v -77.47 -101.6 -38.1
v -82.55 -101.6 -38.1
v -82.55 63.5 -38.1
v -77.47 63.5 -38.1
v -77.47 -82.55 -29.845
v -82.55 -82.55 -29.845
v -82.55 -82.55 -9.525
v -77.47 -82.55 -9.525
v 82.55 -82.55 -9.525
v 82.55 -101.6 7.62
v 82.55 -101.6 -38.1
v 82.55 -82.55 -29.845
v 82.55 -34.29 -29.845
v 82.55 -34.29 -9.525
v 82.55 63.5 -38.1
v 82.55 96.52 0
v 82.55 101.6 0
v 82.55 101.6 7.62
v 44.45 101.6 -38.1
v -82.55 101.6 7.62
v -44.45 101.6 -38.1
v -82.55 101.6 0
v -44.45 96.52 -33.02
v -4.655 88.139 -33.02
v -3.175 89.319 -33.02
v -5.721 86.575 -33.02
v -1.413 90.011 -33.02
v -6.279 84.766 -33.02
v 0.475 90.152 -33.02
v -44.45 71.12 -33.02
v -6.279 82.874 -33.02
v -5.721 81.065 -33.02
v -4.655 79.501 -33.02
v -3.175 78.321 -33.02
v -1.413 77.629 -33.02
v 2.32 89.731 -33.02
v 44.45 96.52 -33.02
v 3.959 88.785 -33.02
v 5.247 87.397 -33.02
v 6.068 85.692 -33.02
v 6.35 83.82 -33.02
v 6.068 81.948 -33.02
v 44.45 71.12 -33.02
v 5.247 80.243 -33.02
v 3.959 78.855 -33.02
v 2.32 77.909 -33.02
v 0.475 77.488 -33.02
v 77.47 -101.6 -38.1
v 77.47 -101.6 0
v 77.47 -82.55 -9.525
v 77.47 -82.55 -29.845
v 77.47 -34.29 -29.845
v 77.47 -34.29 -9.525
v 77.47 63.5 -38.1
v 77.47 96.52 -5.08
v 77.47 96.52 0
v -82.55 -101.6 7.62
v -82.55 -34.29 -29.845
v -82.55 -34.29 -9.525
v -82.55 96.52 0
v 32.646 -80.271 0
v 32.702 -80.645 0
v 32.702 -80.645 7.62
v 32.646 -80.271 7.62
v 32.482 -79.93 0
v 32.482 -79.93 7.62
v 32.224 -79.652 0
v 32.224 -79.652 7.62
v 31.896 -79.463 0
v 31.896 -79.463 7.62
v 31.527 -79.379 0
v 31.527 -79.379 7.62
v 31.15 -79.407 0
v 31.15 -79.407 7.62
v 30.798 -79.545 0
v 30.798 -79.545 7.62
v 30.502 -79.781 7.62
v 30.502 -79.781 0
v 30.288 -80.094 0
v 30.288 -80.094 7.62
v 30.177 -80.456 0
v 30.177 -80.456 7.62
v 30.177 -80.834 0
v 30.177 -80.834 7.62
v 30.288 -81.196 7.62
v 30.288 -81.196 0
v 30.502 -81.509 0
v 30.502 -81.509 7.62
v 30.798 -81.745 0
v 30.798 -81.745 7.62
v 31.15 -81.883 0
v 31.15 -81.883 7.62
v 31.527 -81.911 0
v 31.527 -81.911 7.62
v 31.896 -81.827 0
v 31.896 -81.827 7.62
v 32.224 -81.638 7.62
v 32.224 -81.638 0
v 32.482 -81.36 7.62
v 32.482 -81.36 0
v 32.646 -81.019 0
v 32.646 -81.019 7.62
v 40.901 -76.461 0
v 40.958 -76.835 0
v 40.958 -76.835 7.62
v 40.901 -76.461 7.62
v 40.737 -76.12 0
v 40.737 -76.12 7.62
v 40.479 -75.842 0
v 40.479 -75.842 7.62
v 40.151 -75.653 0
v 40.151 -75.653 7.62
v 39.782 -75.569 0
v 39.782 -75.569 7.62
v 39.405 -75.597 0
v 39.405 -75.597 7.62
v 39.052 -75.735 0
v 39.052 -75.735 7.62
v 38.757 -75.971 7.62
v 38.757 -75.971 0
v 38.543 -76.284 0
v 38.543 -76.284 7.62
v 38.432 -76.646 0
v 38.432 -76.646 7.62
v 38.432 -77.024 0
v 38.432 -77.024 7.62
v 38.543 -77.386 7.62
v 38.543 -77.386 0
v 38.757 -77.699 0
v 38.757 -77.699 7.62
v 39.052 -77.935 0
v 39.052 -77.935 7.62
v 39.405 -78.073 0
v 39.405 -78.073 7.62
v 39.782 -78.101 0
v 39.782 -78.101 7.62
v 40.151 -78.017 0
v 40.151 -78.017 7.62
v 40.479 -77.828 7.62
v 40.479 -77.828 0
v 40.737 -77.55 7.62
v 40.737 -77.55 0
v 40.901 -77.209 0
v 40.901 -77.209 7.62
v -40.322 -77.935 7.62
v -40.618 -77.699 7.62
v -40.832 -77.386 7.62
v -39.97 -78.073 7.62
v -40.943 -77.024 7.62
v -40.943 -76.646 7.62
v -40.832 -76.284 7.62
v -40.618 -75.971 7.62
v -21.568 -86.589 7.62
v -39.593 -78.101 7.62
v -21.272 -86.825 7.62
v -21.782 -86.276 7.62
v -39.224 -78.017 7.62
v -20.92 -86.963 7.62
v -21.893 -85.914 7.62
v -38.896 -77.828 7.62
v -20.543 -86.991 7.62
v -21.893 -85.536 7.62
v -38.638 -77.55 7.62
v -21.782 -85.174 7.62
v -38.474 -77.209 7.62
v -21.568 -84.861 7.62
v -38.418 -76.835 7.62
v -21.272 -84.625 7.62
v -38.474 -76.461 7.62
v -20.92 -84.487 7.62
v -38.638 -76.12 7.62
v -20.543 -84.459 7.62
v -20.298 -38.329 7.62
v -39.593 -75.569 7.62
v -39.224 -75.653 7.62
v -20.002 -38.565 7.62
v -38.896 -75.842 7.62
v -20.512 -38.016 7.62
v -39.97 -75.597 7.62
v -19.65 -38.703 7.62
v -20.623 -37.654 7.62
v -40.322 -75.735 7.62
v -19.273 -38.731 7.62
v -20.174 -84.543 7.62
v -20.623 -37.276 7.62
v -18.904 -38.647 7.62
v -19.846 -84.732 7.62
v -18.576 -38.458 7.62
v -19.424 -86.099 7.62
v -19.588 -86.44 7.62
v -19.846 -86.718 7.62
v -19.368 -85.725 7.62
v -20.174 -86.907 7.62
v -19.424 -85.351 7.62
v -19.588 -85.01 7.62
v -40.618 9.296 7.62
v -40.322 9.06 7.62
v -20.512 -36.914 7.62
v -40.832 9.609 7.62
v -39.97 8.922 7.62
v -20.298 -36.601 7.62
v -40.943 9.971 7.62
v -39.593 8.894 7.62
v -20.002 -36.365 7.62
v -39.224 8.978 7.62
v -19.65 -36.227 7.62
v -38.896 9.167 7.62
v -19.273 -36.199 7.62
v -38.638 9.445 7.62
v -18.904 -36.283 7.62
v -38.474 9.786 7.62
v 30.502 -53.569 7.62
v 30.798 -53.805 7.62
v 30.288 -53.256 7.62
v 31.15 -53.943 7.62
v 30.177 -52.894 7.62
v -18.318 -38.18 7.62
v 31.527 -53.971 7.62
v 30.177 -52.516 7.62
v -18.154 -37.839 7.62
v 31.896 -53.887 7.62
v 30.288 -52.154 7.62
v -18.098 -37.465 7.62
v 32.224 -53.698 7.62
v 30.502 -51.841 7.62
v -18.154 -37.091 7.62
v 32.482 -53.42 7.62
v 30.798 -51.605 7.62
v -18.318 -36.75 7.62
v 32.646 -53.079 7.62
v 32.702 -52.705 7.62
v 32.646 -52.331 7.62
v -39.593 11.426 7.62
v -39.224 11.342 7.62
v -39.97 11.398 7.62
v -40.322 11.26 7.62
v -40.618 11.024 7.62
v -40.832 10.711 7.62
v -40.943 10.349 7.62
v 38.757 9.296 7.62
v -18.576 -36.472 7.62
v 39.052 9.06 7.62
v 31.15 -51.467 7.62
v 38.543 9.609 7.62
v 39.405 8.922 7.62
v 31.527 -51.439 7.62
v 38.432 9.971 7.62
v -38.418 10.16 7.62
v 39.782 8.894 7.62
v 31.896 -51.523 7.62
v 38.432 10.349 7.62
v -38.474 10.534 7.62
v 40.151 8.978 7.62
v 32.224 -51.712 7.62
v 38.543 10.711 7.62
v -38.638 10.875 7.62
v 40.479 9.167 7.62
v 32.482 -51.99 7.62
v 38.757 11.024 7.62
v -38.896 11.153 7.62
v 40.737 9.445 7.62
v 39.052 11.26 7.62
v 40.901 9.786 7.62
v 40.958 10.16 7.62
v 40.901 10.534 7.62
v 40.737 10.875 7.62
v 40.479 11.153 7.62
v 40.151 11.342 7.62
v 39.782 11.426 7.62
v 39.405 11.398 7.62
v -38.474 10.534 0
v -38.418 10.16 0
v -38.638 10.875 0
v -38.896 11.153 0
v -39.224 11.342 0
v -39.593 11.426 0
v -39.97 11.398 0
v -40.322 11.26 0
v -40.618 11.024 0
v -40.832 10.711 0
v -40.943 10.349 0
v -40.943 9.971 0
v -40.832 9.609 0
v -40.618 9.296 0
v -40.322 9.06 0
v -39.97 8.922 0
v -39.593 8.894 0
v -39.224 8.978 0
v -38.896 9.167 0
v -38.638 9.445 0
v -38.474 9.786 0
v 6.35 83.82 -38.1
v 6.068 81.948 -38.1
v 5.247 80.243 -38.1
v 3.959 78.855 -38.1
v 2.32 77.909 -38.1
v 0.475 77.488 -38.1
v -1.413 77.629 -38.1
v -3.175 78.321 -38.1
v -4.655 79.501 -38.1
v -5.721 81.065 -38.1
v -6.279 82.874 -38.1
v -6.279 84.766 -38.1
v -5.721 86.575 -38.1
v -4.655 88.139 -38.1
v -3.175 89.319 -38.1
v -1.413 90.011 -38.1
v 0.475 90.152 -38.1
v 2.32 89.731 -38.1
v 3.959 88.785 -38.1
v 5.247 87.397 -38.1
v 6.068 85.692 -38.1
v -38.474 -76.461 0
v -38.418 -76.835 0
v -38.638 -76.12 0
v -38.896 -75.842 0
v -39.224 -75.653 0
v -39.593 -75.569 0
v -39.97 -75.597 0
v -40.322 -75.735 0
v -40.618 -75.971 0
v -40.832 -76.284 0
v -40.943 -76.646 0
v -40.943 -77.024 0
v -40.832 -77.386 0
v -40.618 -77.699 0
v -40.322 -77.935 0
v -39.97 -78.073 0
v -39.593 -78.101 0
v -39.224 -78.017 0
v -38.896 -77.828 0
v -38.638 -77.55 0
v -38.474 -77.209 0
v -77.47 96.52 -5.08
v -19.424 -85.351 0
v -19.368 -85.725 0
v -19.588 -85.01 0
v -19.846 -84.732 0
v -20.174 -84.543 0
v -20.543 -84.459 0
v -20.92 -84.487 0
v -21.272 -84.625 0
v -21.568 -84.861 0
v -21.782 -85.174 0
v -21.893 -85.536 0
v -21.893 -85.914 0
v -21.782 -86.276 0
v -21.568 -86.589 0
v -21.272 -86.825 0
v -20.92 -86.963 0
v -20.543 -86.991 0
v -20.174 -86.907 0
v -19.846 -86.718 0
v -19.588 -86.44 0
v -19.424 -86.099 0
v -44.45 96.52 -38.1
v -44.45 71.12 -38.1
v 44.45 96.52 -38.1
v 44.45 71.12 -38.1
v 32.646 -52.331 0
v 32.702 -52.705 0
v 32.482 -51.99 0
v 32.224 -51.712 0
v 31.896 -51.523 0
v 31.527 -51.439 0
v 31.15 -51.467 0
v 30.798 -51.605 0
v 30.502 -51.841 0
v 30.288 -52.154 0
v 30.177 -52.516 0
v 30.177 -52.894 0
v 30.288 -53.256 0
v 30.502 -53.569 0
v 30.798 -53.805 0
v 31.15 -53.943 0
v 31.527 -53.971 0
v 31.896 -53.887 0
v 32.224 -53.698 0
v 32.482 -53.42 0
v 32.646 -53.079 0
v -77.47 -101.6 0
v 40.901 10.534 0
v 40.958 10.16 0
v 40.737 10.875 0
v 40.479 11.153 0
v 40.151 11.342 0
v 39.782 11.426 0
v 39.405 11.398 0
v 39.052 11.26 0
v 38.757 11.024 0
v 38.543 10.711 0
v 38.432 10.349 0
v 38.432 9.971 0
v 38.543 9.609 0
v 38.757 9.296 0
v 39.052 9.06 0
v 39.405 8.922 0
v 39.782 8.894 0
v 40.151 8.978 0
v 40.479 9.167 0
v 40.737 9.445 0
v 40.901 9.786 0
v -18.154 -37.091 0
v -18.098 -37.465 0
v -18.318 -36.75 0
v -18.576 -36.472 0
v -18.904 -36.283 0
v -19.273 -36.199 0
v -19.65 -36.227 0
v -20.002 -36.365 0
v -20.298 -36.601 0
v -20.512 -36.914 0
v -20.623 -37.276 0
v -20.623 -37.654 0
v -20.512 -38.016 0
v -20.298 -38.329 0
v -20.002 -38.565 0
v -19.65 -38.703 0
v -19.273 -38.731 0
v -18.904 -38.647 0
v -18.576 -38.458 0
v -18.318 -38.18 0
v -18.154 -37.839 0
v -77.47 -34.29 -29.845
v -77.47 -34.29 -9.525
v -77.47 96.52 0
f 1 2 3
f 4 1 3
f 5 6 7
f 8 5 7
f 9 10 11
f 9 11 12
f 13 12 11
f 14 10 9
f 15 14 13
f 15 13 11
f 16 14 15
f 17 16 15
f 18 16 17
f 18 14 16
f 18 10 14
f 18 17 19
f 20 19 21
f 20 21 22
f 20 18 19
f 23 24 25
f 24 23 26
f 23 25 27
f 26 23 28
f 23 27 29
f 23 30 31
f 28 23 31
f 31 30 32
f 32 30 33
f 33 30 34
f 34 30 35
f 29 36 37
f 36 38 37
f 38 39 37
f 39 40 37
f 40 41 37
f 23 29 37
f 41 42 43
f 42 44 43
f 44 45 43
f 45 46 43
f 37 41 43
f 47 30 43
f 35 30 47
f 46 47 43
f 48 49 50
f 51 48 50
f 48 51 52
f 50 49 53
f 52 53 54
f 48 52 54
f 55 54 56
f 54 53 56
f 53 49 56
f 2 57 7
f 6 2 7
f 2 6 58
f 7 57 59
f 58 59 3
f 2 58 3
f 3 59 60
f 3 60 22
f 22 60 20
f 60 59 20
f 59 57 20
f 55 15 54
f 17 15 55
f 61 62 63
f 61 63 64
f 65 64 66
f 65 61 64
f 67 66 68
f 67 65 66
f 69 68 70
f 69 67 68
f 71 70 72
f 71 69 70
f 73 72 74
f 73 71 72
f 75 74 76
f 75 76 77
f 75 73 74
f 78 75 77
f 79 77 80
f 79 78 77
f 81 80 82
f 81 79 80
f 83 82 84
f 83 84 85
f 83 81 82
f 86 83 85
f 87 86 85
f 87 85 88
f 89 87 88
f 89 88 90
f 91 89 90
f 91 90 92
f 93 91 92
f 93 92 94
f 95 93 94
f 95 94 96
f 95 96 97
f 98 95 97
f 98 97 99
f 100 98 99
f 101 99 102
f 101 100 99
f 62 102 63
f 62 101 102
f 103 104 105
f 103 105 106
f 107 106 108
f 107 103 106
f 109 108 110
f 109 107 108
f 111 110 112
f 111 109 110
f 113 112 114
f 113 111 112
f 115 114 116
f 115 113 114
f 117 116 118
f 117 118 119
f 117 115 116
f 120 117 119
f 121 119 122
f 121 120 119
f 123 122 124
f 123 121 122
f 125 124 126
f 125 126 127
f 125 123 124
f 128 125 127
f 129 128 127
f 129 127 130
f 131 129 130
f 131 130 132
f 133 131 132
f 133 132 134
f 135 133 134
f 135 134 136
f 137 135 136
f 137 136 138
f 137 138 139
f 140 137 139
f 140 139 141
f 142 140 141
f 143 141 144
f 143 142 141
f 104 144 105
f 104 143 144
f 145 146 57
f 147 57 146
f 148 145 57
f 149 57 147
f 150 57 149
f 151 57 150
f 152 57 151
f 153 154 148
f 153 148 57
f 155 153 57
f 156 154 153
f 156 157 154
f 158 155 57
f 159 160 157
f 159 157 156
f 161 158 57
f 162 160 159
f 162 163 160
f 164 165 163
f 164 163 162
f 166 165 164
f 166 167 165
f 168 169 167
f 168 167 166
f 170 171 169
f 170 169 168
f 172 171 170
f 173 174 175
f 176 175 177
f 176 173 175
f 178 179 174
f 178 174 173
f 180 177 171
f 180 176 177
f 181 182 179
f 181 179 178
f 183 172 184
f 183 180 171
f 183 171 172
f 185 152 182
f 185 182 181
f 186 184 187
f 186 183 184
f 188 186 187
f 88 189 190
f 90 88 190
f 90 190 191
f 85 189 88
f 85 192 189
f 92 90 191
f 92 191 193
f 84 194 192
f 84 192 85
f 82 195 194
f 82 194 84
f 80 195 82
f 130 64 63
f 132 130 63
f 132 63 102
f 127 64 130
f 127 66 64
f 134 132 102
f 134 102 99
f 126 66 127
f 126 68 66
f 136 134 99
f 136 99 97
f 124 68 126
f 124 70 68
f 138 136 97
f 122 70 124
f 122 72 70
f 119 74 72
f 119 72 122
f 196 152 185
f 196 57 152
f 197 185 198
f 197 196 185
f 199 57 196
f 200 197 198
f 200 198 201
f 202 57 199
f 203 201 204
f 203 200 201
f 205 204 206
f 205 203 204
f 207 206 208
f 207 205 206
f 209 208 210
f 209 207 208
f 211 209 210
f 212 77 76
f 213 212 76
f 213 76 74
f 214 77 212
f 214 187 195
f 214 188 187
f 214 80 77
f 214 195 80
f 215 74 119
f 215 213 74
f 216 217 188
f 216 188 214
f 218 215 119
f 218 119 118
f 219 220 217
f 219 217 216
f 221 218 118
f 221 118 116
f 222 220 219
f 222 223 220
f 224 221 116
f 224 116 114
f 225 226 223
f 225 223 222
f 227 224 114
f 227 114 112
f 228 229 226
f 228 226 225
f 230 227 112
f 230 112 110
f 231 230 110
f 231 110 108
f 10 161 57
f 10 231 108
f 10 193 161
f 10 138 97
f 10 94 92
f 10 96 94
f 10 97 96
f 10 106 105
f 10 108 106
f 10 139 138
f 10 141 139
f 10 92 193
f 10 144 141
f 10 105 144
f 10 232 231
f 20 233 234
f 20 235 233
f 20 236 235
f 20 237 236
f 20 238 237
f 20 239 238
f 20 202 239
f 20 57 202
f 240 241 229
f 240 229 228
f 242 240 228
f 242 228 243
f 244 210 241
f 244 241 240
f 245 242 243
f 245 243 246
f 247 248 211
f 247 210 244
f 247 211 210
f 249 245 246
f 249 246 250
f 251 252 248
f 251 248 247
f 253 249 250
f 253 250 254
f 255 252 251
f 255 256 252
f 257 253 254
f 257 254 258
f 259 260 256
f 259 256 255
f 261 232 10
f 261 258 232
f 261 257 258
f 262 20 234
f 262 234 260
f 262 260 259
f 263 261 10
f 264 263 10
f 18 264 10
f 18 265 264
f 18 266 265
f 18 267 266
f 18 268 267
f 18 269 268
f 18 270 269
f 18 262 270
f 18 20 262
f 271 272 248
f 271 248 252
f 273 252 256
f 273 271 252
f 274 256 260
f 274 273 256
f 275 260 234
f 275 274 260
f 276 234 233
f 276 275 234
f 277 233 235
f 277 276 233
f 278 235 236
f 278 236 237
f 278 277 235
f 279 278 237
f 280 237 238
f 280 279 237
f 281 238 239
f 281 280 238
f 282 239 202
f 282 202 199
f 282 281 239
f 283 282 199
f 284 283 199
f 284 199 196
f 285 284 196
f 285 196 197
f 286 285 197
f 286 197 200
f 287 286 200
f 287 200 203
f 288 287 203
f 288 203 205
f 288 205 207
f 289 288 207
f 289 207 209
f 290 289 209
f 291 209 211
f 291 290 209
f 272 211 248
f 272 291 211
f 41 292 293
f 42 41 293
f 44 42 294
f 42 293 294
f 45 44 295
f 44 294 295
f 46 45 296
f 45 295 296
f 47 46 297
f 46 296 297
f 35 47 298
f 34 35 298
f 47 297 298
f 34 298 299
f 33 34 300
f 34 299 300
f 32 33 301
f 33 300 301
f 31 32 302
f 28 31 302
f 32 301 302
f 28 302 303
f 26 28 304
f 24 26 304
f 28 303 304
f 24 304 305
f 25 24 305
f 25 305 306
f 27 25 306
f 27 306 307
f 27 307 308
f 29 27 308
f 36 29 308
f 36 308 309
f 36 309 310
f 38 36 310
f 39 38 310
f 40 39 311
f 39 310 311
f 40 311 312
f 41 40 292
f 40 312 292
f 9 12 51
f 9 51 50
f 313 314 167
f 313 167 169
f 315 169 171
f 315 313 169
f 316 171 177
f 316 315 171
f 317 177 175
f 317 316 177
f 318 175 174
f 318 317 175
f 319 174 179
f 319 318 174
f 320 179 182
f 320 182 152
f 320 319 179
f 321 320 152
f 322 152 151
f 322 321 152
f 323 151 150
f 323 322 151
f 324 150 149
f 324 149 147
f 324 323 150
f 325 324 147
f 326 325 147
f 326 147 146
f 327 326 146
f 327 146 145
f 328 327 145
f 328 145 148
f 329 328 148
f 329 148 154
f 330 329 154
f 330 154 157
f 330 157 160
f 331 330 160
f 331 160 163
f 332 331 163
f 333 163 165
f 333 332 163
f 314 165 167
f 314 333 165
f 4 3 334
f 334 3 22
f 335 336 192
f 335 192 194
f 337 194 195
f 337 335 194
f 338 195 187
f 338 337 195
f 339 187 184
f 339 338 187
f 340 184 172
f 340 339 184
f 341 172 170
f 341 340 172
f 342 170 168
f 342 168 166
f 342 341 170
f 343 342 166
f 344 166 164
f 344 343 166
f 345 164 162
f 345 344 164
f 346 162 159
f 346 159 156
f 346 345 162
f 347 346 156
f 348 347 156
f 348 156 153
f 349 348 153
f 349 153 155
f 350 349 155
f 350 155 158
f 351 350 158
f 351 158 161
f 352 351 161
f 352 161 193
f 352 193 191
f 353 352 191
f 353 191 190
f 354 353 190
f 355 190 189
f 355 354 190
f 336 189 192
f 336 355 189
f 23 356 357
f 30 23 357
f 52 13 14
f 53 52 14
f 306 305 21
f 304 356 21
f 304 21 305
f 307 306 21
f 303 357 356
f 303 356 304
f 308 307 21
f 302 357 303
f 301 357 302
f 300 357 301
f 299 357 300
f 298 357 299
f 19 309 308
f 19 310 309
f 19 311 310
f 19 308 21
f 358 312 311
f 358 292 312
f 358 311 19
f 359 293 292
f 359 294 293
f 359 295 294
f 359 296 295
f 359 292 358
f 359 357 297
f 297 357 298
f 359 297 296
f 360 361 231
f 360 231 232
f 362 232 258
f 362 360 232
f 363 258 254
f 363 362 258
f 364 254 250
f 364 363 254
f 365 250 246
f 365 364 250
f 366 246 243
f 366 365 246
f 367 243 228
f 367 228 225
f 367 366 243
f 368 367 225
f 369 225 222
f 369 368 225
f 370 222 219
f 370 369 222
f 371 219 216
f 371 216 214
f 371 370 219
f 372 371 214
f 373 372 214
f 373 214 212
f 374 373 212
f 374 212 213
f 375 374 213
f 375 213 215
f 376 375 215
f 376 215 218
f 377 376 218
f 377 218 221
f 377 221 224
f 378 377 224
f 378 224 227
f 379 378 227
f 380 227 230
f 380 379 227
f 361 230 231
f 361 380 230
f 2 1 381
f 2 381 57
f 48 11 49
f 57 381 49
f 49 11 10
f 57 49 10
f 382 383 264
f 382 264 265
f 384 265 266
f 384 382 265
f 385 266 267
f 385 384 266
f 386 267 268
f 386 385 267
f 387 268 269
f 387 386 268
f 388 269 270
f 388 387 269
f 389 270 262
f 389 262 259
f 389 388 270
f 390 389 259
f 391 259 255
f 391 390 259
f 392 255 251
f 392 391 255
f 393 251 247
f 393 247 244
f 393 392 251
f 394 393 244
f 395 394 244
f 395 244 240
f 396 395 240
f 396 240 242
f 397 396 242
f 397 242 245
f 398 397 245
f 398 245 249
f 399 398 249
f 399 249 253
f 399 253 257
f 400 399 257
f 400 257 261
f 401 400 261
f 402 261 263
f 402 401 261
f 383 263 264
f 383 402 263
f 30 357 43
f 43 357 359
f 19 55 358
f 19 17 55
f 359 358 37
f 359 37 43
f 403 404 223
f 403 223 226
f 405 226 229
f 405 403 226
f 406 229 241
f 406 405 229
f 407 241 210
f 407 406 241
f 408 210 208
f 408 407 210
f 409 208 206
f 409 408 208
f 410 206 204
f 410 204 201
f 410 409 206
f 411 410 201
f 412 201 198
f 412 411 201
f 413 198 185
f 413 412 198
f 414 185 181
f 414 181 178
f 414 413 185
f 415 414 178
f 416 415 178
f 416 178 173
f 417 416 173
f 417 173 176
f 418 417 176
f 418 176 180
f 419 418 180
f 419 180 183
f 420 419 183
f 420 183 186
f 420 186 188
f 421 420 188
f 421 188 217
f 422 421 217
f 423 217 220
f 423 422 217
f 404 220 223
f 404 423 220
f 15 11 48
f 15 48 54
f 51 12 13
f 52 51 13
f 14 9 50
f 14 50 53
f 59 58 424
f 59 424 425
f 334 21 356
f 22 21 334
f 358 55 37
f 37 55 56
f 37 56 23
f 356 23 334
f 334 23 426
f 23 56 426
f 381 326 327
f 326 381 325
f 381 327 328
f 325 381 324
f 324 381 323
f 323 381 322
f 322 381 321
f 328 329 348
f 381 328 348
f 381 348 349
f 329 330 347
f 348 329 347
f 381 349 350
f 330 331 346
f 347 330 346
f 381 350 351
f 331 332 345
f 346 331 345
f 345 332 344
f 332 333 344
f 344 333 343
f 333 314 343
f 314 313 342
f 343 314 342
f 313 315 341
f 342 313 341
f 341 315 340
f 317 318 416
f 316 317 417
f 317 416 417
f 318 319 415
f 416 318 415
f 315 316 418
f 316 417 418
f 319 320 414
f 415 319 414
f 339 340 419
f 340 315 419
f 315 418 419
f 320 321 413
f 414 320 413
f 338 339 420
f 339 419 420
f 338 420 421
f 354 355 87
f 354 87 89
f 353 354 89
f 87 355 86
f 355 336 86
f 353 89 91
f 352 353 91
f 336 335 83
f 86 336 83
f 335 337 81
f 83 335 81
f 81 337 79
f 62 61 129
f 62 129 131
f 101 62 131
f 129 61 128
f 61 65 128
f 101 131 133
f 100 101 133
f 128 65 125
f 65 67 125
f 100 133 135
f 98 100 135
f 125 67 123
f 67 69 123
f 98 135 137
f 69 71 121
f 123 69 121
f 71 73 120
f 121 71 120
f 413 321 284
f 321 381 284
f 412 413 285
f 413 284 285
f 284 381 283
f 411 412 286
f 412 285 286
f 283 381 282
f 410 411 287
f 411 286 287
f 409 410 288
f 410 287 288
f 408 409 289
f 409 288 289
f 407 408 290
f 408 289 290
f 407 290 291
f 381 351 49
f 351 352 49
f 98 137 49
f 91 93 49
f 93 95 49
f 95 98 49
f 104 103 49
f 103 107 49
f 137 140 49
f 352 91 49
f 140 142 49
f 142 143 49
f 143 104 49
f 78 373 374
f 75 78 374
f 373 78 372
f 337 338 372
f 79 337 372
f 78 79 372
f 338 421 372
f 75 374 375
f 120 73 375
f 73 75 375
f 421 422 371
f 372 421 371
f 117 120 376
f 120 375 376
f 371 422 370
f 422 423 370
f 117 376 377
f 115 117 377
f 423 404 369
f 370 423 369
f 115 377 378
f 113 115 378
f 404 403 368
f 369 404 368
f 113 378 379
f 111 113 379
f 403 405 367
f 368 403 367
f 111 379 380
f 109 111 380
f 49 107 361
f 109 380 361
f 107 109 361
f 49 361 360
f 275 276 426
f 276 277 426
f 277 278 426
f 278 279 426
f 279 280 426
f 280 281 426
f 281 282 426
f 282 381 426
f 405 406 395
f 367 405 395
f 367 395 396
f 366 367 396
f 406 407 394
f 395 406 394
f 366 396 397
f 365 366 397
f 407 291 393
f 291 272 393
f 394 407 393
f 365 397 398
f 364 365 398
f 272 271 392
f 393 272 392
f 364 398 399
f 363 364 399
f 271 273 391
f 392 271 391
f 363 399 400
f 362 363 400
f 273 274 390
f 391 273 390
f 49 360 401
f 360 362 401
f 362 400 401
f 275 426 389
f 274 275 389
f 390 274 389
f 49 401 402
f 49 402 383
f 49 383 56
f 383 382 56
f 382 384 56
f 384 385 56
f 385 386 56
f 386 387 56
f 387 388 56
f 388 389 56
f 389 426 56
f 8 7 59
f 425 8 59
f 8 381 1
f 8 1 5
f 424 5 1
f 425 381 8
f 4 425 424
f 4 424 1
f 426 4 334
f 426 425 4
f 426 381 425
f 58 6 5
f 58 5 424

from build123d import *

# Parameters (mm, degrees)
F0_W     = 165.1
F0_H     = 203.2
F0_R     = 1.27
F1_DEPTH = 7.62
F2_W     = 165.1
F2_H     = 38.1
F2_W_2   = 48.26
F2_H_2   = 20.32
F3_DEPTH = 5.08
F6_DEPTH = 5.08
F7_W     = 88.9
F7_H     = 25.4
F7_R     = 6.35
F8_DEPTH = 5.08


with BuildPart() as f1:
    # F0 (on Top) → F1 (new body)
    with BuildSketch(Plane.XY):
        Rectangle(F0_W, F0_H)
        with Locations((-39.6875, -76.835)):
            Circle(F0_R, mode=Mode.SUBTRACT)
        with Locations((-20.6375, -85.725)):
            Circle(F0_R, mode=Mode.SUBTRACT)
        with Locations((-19.3675, -37.465)):
            Circle(F0_R, mode=Mode.SUBTRACT)
        with Locations((31.4325, -80.645)):
            Circle(F0_R, mode=Mode.SUBTRACT)
        with Locations((39.6875, -76.835)):
            Circle(F0_R, mode=Mode.SUBTRACT)
        with Locations((31.4325, -52.705)):
            Circle(F0_R, mode=Mode.SUBTRACT)
        with Locations((-39.6875, 10.16)):
            Circle(F0_R, mode=Mode.SUBTRACT)
        with Locations((39.6875, 10.16)):
            Circle(F0_R, mode=Mode.SUBTRACT)
    extrude(amount=F1_DEPTH)

    # F4: F3 across plane


with BuildPart() as f3:
    # F2 (on face) → F3 (new body)
    with BuildSketch(Plane.YZ.offset(82.55)):
        with Locations((-19.05, -19.05)):
            Rectangle(F2_W, F2_H)
        with Locations((-58.42, -19.685)):
            Rectangle(F2_W_2, F2_H_2, mode=Mode.SUBTRACT)
        Polygon((101.6, 0), (63.5, 0), (63.5, -38.1), align=None)
    extrude(amount=-F3_DEPTH)


with BuildPart() as f1_1:
    add(f1.part)
    add(f3.part.mirror(Plane.YZ))


    add(f3.part)  # F6 merges F3
    # F5 (on face) → F6 (join)
    with BuildSketch(Plane(origin=(0, 101.6, 0), x_dir=(-1, 0, 0), z_dir=(0, 1, 0))):
        Polygon((77.47, 0), (-82.55, 0), (-44.45, -38.1), (44.45, -38.1), (82.55, 0), align=None)
    extrude(amount=-F6_DEPTH)

    # F7 (on face) → F8 (join)
    with BuildSketch(Plane(origin=(0, 0, -38.1), x_dir=(1, 0, 0), z_dir=(0, 0, -1))):
        with Locations((0, -83.82)):
            Rectangle(F7_W, F7_H)
        with Locations((0, -83.82)):
            Circle(F7_R, mode=Mode.SUBTRACT)
    extrude(amount=-F8_DEPTH)


solid = f1_1.part
